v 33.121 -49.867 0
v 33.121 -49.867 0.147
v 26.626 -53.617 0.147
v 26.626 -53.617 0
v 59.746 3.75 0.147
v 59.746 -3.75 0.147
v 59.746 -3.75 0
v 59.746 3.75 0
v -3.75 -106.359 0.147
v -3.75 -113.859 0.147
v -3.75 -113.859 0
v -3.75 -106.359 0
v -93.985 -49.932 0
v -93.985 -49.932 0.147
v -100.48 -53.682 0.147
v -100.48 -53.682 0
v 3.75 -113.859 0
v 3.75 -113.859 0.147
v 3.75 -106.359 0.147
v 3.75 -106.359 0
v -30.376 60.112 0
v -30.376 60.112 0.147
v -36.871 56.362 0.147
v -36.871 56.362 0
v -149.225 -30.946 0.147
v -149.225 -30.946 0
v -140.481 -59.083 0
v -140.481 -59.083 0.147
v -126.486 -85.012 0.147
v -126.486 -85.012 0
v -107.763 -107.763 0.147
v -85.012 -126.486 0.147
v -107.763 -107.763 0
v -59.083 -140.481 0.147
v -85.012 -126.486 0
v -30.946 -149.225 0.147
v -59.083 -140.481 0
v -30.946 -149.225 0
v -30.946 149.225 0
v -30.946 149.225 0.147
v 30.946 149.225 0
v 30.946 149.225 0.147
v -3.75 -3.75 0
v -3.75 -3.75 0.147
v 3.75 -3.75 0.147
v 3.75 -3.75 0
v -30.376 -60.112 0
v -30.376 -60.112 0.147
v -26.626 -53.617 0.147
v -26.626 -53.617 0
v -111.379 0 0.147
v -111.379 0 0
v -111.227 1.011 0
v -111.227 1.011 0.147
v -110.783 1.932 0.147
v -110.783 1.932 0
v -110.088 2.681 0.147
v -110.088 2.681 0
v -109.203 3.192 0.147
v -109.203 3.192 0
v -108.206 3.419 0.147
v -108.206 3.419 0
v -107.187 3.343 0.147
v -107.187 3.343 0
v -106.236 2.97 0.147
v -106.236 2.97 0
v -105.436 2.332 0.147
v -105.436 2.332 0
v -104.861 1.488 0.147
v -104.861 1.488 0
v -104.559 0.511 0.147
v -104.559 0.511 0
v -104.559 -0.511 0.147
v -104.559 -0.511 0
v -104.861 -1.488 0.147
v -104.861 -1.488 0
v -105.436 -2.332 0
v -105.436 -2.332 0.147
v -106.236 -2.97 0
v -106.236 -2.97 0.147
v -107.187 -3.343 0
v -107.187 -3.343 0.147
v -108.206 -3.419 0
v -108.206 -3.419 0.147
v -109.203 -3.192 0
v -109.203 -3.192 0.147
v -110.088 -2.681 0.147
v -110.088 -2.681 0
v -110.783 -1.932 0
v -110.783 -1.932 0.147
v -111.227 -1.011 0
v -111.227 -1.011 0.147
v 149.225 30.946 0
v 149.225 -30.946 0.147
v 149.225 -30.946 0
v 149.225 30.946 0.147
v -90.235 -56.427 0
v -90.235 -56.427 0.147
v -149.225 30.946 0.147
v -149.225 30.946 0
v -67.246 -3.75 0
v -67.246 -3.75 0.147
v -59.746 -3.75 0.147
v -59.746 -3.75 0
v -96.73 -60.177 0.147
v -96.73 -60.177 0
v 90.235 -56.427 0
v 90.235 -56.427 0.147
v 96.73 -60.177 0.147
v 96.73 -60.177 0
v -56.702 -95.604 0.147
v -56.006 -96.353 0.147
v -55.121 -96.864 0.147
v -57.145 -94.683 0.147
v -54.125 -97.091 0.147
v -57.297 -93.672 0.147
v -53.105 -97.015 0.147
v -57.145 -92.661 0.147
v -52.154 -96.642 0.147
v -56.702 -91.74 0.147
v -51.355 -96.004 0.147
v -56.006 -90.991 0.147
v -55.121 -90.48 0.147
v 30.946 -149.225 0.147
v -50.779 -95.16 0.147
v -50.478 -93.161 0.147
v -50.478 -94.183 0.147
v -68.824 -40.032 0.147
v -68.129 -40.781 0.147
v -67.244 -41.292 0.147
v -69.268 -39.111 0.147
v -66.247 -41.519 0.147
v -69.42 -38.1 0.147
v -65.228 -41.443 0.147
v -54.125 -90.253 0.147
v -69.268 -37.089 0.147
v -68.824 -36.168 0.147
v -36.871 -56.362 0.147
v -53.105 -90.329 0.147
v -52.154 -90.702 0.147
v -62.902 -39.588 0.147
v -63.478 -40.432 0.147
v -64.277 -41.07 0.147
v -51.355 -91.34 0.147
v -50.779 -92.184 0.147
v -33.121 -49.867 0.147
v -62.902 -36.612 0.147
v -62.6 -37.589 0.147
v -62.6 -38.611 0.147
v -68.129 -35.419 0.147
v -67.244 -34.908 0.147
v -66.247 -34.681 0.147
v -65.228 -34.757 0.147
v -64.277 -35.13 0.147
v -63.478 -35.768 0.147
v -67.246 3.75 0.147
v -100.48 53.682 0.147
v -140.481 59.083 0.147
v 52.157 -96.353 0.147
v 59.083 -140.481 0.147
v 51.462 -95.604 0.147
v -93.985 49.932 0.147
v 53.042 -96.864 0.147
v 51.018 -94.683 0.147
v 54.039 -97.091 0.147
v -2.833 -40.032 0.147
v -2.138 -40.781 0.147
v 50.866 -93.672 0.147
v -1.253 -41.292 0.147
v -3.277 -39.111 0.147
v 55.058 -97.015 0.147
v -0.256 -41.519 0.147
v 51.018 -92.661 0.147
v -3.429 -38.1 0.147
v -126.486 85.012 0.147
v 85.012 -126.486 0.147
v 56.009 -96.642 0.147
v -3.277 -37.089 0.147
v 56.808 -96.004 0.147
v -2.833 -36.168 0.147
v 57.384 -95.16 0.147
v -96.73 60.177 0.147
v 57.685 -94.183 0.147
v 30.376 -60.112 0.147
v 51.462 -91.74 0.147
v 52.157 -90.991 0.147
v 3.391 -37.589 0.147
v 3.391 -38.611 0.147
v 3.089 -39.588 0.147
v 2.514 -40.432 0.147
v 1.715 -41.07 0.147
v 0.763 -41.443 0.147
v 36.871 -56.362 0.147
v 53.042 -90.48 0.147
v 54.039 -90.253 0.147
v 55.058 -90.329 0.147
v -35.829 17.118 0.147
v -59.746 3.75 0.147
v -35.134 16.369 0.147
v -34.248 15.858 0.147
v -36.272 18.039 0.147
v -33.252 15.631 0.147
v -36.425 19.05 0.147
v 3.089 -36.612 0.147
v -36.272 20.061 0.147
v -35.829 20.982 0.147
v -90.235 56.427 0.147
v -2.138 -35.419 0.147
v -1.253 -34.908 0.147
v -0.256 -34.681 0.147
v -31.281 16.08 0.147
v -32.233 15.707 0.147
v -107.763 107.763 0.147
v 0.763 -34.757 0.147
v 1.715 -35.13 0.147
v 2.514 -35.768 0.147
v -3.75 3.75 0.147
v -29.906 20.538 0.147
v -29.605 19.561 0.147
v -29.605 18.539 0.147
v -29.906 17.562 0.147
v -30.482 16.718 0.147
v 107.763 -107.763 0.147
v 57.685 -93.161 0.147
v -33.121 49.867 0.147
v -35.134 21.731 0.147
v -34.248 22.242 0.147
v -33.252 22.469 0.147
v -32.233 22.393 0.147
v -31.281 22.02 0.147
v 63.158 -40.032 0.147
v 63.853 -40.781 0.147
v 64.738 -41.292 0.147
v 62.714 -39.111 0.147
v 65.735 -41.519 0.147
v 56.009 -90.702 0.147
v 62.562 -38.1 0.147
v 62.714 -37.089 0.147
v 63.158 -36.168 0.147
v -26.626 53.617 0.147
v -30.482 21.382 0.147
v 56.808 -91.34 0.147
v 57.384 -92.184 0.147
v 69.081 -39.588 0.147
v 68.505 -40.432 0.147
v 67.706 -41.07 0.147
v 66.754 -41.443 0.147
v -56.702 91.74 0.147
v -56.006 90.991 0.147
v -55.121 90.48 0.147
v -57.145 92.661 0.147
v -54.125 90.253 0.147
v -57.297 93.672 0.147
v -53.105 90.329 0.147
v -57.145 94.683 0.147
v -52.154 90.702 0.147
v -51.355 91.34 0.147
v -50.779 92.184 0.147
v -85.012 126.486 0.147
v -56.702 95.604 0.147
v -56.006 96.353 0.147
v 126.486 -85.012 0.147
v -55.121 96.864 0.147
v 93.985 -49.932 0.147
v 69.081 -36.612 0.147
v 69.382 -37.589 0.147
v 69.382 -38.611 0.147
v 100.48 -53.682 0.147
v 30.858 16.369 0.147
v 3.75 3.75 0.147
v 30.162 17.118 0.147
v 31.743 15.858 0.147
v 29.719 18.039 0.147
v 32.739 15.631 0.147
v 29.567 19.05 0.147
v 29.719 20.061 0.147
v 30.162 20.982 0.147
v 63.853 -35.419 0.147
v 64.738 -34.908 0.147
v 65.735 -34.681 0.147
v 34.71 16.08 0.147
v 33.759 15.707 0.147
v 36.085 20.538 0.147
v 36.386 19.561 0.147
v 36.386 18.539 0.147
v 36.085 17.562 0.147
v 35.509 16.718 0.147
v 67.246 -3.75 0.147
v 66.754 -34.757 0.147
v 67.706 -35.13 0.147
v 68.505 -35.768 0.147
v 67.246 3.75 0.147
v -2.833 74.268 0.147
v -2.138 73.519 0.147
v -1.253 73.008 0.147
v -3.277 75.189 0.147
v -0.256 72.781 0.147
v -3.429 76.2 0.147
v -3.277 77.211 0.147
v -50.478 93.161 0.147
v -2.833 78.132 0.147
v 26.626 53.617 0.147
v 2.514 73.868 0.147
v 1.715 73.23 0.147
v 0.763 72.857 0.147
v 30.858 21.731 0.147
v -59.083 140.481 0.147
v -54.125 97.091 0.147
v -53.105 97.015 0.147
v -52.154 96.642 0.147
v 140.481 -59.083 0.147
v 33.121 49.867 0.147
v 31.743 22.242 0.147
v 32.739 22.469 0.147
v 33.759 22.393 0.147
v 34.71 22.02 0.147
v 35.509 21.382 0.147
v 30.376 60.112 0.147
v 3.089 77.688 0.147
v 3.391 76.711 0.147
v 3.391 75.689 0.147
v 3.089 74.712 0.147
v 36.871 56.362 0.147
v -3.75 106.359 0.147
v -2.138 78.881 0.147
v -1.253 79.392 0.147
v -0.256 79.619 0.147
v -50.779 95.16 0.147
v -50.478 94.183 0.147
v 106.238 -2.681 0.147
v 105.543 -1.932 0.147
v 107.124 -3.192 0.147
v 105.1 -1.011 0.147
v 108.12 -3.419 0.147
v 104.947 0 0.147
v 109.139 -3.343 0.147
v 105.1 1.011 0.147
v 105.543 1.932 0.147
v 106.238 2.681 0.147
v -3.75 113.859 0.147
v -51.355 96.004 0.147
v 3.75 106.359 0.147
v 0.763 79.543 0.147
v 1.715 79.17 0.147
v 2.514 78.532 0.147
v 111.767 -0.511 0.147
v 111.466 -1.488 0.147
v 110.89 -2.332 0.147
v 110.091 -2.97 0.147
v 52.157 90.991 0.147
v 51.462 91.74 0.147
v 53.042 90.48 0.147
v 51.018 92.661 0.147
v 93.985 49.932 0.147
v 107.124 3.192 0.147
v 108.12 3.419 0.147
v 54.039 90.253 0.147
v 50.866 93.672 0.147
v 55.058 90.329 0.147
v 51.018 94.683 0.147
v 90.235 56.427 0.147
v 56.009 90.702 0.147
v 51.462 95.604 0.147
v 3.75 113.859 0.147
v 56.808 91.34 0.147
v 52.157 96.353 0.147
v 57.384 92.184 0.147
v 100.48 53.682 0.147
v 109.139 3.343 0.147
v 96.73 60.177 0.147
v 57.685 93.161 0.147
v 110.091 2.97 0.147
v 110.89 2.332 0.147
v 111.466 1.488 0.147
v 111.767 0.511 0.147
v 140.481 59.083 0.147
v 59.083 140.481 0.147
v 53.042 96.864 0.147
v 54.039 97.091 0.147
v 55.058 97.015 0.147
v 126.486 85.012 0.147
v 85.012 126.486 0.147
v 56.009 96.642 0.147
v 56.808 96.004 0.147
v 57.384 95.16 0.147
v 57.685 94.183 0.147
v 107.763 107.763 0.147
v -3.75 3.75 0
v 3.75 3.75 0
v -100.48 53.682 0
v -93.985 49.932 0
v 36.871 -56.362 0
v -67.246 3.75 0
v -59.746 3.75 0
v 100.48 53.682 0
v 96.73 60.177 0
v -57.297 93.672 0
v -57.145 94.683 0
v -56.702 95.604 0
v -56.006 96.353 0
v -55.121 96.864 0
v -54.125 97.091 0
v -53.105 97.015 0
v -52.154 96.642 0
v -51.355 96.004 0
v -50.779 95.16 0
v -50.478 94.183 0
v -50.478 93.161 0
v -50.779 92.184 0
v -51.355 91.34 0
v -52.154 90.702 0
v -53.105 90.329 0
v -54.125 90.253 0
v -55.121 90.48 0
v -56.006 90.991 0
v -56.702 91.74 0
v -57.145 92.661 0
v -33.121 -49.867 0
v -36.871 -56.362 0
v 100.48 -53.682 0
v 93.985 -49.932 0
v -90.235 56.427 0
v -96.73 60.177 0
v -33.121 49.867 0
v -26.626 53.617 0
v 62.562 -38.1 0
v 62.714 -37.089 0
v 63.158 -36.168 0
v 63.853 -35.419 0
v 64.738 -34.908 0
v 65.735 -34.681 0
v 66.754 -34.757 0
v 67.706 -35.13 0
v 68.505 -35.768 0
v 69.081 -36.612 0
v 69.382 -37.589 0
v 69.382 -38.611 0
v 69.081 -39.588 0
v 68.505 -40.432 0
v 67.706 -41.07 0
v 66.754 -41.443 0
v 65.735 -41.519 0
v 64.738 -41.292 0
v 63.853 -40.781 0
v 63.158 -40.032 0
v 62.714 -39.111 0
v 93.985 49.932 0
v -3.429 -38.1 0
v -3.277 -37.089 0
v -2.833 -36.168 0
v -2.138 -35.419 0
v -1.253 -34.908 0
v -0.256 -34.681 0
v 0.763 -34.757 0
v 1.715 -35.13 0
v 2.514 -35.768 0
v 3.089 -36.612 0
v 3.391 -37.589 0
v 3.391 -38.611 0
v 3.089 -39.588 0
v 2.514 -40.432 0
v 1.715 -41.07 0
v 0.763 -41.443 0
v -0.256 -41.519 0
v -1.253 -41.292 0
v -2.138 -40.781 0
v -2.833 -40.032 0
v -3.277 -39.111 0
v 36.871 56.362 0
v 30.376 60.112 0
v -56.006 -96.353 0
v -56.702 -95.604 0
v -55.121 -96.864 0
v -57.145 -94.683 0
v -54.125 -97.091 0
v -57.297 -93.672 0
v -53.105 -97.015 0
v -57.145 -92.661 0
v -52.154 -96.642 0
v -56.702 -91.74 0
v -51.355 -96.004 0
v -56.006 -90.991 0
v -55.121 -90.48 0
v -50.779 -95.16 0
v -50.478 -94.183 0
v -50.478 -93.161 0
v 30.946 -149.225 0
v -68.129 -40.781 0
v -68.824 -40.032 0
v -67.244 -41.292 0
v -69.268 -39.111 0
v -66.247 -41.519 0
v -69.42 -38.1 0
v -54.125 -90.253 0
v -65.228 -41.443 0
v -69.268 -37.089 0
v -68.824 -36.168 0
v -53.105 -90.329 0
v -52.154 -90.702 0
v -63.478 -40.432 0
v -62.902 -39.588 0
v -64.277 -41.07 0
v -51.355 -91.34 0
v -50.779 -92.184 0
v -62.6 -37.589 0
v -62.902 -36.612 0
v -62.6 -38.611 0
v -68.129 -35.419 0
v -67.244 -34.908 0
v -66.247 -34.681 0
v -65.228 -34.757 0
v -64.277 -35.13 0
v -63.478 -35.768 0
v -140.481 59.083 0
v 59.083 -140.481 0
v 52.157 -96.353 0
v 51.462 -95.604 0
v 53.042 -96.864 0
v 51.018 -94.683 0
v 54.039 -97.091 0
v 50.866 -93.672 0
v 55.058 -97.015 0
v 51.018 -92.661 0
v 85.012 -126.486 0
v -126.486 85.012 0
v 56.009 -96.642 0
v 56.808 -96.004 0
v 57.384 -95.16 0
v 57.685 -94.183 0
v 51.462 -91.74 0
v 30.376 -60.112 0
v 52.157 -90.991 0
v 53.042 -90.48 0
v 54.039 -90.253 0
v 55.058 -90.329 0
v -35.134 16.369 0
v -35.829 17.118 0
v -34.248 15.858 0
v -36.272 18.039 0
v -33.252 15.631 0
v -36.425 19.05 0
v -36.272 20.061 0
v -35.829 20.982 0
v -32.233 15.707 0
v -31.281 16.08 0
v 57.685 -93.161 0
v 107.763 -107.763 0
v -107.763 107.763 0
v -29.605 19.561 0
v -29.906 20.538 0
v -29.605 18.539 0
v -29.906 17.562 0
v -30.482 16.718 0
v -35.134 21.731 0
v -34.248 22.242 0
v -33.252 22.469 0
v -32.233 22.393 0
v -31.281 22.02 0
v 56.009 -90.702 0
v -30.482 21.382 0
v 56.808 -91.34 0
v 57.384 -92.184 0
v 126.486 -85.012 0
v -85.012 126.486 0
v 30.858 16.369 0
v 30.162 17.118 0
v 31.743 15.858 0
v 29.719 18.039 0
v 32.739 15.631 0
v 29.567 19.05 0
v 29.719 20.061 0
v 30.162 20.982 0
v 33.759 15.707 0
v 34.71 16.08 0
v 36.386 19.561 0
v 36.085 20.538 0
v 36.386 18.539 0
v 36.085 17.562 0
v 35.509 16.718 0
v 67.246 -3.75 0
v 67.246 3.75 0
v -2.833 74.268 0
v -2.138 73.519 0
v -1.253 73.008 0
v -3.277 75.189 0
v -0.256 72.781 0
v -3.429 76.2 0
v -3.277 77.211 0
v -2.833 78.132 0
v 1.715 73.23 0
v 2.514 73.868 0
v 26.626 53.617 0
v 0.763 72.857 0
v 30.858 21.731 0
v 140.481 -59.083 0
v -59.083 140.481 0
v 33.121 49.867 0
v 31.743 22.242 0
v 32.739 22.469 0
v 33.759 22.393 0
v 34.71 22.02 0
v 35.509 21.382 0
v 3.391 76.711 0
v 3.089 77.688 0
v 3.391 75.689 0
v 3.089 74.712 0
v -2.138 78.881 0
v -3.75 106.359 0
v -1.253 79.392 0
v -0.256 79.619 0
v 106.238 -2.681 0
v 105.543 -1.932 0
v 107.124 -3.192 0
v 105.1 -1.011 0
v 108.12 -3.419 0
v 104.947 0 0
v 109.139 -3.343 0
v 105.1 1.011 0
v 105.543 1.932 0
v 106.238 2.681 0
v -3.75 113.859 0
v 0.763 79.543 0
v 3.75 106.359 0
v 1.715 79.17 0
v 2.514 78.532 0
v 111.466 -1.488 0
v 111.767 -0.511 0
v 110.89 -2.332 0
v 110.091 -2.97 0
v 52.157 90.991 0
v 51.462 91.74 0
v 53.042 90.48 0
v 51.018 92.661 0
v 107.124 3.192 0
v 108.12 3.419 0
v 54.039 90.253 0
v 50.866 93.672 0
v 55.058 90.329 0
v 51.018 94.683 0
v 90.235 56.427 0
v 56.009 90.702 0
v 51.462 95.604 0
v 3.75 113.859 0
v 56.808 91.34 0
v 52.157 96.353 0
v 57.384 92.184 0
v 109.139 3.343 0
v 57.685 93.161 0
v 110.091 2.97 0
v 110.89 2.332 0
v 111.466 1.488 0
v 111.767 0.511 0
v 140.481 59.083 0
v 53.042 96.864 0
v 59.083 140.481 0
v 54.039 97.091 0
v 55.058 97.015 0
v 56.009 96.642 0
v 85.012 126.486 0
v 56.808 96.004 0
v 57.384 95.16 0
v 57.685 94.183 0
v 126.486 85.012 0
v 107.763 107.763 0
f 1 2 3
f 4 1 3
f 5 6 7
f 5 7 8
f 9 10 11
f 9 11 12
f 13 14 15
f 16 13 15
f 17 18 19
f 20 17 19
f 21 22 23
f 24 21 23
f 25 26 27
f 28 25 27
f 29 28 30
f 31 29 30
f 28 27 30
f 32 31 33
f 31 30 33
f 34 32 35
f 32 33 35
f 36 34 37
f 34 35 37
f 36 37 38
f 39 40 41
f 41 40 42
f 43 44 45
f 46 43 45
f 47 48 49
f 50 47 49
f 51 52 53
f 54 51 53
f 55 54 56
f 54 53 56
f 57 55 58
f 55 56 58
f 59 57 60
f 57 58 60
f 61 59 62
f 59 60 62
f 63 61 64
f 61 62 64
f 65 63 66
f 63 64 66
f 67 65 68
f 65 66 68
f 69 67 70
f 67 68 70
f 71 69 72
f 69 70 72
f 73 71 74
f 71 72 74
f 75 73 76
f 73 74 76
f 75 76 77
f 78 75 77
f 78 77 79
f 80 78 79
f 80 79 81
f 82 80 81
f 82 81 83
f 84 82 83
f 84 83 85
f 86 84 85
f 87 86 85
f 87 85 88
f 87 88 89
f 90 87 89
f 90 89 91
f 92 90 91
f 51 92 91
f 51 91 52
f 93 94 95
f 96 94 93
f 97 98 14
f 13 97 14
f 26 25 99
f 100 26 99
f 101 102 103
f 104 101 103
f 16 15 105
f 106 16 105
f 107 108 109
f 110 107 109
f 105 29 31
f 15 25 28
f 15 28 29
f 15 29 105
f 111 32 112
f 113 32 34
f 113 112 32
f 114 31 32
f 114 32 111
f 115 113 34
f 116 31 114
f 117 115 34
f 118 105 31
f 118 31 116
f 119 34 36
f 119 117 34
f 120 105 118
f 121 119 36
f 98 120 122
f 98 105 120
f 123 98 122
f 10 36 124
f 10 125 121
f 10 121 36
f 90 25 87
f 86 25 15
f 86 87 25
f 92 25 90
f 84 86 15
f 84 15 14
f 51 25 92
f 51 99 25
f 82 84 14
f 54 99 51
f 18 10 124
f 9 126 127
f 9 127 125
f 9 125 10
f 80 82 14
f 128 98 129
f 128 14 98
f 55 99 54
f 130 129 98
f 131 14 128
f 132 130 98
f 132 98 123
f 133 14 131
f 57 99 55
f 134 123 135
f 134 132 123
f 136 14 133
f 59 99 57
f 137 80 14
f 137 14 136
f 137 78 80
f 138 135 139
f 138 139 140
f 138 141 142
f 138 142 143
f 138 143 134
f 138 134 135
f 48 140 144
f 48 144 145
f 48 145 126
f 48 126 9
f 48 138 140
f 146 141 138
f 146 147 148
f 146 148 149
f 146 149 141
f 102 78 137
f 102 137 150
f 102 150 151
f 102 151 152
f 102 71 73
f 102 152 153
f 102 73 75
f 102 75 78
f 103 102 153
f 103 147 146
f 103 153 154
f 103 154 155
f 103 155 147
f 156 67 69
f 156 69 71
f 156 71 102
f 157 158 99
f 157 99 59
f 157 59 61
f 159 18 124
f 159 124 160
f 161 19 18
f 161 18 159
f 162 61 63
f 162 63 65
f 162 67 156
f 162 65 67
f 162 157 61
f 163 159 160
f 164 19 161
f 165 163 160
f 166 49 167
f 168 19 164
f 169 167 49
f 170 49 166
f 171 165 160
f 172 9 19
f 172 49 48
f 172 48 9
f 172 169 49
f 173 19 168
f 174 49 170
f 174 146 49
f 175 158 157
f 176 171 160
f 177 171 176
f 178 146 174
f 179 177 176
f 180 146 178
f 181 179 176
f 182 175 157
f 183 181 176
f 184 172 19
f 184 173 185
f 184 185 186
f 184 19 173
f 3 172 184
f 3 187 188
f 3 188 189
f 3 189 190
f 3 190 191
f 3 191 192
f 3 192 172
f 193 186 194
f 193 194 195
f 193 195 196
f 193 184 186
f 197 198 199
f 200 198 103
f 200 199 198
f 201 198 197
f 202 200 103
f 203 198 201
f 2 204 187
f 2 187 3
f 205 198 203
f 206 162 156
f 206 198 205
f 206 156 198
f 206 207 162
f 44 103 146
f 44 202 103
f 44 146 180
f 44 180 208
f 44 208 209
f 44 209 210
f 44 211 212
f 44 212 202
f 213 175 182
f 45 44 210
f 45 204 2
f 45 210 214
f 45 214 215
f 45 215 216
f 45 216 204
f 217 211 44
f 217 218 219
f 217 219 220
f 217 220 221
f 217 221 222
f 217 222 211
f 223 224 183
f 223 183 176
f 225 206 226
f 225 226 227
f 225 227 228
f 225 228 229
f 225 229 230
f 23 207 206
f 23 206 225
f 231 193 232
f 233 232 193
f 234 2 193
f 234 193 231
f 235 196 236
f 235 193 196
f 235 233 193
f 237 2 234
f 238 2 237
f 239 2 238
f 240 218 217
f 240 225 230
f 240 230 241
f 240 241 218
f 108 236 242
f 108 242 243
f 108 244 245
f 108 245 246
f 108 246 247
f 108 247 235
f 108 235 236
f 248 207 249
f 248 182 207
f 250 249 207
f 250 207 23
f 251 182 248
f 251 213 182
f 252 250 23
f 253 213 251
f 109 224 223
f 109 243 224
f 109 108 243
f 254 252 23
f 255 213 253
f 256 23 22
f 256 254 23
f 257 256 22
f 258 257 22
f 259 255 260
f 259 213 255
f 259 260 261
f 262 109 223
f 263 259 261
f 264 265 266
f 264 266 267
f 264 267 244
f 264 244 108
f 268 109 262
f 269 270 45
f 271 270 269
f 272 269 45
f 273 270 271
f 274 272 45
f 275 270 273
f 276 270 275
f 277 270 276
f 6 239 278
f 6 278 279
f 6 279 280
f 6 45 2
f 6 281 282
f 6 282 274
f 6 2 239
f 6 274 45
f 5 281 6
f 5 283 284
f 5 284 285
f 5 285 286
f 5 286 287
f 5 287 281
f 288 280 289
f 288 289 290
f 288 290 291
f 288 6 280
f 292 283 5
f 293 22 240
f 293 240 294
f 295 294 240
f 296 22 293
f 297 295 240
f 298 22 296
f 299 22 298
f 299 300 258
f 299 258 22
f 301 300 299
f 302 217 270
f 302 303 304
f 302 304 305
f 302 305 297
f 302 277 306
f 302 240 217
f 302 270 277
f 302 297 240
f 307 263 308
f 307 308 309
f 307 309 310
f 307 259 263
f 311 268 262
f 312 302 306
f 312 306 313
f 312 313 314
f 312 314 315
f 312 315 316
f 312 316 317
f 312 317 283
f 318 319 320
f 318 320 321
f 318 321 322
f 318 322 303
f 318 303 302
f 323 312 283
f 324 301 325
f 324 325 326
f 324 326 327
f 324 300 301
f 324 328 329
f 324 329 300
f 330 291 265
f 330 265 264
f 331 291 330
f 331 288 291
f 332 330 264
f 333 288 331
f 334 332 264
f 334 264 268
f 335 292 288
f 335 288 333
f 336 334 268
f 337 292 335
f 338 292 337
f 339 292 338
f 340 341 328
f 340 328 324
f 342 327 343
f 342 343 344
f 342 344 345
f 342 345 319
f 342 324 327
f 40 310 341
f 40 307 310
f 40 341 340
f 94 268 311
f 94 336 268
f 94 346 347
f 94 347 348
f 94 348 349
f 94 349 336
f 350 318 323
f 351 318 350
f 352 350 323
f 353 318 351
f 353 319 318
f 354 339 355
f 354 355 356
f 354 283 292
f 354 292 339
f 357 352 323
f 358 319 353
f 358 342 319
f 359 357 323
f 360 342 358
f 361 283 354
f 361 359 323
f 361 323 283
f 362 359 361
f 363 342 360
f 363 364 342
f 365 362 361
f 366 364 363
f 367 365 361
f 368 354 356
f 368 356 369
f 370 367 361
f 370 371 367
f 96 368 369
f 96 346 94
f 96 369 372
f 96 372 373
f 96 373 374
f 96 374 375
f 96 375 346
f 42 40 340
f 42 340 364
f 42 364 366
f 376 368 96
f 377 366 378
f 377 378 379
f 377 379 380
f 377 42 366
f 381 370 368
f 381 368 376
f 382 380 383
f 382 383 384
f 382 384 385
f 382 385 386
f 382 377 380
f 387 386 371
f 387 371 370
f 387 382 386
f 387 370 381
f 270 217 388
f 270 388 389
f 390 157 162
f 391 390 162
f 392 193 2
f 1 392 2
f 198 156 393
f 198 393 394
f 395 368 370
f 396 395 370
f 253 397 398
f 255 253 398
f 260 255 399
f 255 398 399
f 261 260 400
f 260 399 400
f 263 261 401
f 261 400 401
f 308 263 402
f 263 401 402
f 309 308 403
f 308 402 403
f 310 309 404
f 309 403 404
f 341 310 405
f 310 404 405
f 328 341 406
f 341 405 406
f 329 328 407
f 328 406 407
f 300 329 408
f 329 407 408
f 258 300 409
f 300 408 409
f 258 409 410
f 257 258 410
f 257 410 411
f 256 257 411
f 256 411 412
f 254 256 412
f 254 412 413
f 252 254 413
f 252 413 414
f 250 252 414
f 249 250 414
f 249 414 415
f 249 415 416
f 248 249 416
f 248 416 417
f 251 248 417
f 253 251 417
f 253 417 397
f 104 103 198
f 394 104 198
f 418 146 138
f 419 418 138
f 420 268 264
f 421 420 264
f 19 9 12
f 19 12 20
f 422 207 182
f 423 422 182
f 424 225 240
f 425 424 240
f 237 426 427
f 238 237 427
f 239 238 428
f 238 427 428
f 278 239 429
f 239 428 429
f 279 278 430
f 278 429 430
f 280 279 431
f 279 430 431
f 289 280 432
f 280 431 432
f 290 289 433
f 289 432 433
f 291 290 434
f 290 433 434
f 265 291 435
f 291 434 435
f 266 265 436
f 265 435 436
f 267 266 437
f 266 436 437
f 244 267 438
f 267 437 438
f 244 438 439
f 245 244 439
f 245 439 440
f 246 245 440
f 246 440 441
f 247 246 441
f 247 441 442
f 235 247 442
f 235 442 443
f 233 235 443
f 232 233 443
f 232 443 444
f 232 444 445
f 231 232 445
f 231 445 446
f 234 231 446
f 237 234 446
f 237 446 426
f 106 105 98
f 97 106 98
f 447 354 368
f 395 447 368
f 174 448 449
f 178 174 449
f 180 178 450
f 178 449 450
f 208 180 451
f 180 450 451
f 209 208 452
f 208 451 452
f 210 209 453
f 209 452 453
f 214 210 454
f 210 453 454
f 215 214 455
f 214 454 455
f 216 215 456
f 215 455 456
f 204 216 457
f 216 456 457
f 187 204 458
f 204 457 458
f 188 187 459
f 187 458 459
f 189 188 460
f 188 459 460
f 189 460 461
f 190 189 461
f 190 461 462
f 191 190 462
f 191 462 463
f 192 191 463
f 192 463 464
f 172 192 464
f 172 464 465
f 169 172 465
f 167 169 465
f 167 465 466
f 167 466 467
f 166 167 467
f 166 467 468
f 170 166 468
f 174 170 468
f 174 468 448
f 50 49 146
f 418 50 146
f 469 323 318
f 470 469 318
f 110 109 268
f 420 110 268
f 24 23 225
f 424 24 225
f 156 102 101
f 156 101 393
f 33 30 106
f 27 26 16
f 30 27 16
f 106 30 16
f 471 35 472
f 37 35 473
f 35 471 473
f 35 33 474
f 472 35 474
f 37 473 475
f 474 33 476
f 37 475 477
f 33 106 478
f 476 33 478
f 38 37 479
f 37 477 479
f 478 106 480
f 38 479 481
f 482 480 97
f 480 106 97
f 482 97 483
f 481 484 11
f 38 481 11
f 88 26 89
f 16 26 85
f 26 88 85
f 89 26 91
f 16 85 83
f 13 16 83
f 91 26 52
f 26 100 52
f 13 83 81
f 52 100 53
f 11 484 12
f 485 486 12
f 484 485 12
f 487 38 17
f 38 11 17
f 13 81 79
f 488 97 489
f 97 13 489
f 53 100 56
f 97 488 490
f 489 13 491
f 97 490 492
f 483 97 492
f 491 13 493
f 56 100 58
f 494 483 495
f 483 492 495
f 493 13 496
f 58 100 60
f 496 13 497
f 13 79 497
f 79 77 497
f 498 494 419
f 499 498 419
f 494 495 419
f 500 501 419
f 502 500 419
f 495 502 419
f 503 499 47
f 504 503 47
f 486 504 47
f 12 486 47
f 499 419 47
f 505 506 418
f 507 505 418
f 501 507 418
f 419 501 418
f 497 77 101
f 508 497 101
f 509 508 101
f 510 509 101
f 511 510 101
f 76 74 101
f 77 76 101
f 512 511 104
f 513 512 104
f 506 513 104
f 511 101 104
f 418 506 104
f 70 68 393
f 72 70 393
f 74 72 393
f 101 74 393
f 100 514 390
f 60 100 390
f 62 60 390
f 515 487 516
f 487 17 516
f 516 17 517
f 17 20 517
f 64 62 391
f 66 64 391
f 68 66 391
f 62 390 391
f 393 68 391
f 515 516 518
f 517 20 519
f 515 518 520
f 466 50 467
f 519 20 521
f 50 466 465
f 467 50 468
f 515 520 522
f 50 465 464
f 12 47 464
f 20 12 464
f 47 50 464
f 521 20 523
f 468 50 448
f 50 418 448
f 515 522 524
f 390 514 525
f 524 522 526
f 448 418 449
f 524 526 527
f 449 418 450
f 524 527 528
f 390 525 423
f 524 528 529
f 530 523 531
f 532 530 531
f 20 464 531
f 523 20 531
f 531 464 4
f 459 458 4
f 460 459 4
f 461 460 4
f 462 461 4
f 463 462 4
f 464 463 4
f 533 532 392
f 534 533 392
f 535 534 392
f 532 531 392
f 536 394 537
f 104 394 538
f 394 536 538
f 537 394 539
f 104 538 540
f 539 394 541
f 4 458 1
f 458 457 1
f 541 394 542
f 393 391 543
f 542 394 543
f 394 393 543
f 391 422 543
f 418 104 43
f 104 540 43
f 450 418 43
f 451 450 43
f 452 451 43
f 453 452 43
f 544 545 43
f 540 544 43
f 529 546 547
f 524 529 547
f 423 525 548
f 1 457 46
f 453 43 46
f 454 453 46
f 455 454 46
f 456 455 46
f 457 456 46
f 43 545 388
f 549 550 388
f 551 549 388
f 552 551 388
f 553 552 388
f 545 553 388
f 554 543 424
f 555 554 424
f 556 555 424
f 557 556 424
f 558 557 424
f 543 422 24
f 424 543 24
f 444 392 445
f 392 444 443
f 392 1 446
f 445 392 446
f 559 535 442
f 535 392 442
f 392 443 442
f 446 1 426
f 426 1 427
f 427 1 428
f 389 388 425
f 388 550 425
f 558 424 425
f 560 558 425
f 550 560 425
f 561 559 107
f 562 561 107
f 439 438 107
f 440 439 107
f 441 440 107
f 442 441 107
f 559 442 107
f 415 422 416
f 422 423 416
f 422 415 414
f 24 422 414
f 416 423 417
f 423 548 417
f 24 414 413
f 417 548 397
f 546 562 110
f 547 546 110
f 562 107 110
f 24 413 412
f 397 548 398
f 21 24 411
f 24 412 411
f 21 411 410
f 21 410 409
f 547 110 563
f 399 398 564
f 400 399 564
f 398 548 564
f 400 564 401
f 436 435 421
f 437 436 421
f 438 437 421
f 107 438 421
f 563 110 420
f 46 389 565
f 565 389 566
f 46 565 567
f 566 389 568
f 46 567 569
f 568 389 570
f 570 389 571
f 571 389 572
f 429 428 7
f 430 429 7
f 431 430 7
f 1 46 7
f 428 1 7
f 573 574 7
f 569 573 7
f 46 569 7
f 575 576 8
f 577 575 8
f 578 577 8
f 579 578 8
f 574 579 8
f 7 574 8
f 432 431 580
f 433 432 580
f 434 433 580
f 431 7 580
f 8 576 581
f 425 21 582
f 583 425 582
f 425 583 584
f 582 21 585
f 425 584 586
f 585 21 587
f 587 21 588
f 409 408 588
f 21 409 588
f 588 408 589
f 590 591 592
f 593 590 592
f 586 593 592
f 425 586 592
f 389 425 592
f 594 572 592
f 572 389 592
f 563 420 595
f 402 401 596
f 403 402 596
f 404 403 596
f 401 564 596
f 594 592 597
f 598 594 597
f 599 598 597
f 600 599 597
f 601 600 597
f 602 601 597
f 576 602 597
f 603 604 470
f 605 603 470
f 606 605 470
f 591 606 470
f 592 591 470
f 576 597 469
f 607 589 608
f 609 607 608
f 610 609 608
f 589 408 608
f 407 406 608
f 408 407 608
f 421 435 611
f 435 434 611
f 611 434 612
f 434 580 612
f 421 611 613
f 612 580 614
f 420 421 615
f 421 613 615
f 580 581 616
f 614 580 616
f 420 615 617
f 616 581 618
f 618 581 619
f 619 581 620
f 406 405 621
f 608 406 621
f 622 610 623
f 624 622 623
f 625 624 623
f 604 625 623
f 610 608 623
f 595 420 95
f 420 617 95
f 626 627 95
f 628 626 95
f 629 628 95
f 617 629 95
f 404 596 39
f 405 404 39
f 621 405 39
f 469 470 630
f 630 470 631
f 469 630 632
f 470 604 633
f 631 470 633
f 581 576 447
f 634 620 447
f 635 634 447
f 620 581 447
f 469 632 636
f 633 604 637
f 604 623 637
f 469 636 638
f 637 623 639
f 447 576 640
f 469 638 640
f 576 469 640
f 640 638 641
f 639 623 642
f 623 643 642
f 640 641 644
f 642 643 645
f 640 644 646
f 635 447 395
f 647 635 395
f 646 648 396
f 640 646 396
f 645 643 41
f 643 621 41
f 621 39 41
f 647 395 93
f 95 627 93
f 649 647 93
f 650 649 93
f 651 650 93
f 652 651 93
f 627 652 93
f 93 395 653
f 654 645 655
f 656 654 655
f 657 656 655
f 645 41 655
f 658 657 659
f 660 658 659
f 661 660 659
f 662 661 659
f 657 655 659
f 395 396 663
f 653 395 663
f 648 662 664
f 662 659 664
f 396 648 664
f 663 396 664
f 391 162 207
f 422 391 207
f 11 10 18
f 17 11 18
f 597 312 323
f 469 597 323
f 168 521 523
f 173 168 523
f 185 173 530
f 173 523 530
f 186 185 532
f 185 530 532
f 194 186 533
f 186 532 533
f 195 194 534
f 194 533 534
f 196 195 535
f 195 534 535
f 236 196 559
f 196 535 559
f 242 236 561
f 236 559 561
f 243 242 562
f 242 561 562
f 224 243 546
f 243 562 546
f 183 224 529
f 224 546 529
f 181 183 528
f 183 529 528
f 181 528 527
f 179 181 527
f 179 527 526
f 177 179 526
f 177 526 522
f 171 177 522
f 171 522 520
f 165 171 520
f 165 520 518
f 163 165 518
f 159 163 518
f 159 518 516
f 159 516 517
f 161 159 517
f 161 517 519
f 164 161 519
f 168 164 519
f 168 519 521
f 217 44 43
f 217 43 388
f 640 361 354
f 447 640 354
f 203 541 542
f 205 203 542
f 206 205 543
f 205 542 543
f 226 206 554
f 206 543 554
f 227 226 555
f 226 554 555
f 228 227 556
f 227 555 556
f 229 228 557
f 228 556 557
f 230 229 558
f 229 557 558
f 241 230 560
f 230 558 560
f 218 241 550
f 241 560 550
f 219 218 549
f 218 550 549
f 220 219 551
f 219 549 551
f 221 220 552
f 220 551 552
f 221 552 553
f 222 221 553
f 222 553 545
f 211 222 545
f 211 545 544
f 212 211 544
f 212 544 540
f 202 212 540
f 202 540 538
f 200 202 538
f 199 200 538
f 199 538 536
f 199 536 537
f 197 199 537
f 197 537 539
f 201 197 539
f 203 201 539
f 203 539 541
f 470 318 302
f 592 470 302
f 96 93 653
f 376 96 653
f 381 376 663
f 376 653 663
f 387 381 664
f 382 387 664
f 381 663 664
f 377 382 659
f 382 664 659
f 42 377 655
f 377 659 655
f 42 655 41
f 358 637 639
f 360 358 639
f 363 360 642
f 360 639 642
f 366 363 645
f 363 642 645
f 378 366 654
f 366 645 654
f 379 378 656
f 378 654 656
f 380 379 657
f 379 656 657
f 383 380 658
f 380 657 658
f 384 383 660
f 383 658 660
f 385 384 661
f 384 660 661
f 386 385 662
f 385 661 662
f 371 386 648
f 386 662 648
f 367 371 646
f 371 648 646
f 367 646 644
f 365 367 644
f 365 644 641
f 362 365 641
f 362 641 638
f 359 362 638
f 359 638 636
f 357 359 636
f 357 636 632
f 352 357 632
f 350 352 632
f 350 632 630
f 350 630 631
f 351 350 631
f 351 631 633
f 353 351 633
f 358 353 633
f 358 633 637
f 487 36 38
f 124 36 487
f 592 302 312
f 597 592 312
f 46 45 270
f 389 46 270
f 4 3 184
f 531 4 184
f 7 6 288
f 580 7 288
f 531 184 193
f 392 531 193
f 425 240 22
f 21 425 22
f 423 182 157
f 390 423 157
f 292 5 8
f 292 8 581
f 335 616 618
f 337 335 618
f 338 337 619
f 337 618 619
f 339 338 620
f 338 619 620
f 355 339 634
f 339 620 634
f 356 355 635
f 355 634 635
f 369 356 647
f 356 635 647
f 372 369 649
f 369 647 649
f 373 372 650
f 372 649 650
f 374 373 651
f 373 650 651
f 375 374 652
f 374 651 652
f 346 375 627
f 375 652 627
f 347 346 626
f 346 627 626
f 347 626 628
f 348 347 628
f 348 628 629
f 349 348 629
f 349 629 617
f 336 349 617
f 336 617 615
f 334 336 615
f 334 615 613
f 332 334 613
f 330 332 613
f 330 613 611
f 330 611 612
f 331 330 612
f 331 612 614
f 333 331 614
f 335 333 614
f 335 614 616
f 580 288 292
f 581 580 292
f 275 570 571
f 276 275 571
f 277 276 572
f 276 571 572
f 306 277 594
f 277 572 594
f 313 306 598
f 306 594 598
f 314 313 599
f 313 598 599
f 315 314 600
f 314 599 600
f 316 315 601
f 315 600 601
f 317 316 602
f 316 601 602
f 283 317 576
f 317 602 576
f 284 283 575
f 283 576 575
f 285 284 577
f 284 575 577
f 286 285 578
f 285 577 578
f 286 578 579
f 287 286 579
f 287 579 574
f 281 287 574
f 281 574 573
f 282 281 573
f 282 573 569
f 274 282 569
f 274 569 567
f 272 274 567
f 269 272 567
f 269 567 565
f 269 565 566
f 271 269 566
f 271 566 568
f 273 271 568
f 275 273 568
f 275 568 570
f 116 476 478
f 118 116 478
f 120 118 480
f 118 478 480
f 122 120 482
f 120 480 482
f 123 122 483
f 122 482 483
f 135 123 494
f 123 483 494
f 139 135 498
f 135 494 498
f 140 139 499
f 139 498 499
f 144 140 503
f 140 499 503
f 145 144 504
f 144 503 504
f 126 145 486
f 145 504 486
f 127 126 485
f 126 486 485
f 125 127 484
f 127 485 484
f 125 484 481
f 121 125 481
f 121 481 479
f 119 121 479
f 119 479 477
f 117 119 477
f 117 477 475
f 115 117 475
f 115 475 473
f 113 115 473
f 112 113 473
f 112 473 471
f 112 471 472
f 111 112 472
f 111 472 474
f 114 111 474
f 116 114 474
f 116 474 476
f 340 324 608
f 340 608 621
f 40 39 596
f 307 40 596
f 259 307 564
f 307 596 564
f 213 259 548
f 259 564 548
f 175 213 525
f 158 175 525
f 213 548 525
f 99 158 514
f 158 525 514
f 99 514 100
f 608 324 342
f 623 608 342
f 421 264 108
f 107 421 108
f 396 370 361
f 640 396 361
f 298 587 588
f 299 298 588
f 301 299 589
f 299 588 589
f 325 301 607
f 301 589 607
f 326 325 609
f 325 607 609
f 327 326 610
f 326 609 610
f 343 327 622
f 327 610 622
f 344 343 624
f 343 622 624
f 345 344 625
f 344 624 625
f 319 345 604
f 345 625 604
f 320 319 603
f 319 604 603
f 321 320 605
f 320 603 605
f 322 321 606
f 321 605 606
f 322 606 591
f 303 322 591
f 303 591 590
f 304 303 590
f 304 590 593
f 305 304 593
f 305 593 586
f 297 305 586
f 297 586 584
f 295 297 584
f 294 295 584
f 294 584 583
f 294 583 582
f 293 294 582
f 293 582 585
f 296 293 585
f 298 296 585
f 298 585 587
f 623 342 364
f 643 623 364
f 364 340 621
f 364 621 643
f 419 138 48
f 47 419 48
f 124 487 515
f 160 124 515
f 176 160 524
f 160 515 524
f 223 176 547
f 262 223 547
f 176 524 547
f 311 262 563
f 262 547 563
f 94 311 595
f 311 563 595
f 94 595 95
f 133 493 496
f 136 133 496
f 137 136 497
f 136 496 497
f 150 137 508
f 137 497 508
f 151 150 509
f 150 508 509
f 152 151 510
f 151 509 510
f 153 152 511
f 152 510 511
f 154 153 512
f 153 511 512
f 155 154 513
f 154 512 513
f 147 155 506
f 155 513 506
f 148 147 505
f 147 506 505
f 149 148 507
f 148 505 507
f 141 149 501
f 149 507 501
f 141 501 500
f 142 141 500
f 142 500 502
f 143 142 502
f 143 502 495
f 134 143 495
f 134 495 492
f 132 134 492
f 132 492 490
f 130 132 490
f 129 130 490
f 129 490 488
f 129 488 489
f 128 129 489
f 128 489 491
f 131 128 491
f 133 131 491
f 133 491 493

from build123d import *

# Parameters (mm, degrees)
F0_R     = 152.4
F1_DEPTH = 0.14732
F2_W     = 12.7
F2_H     = 127
F2_W_2   = 127
F2_H_2   = 12.7
F3_DEPTH = 25.4
F5_D     = 6.858
F6_W     = 7.5
F6_H     = 7.5
F7_DEPTH = 25.4


with BuildPart() as f1:
    # F0 (on Top) → F1 (new body)
    with BuildSketch(Plane.XY):
        Circle(F0_R)
    extrude(amount=F1_DEPTH)

    # F2 (on face) → F3 (cut)
    with BuildSketch(Plane.XY.offset(0.14732)):
        with Locations((-155.575, 0)):
            Rectangle(F2_W, F2_H)
        with Locations((0, -155.575)):
            Rectangle(F2_W_2, F2_H_2)
        with Locations((0, 155.575)):
            Rectangle(F2_W_2, F2_H_2)
        with Locations((155.575, 0)):
            Rectangle(F2_W, F2_H)
    extrude(amount=-F3_DEPTH, mode=Mode.SUBTRACT)

    # F5 (through all)
    with Locations(Plane.XY.offset(0.14732)):
        with Locations((-53.868412, -93.672059), (54.294765, -93.672059), (65.991136, -38.1), (0, -38.1), (-65.991136, -38.1), (-107.95, 0), (-32.995568, 19.05), (32.995568, 19.05), (108.376353, 0), (0, 76.2), (54.294765, 93.672059), (-53.868412, 93.672059)):
            Hole(F5_D / 2)

    # F6 (on face) → F7 (cut)
    with BuildSketch(Plane.XY.offset(0.14732)):
        Rectangle(F6_W, F6_H)
        with Locations((-63.4965, 0)):
            Rectangle(F6_W, F6_H)
        with Locations((0, 110.109)):
            Rectangle(F6_W, F6_H)
        Polygon((-36.870845, -56.362177), (-30.375655, -60.112177), (-26.625655, -53.616987), (-33.120845, -49.866987), align=None)
        Polygon((30.375655, -60.112177), (36.870845, -56.362177), (33.120845, -49.866987), (26.625655, -53.616987), align=None)
        with Locations((63.4965, 0)):
            Rectangle(F6_W, F6_H)
        Polygon((36.870845, 56.362177), (30.375655, 60.112177), (26.625655, 53.616987), (33.120845, 49.866987), align=None)
        Polygon((-30.375655, 60.112177), (-36.870845, 56.362177), (-33.120845, 49.866987), (-26.625655, 53.616987), align=None)
        Polygon((-100.479786, 53.681905), (-93.984596, 49.931905), (-90.234596, 56.427095), (-96.729786, 60.177095), align=None)
        Polygon((-96.729786, -60.177095), (-90.234596, -56.427095), (-93.984596, -49.931905), (-100.479786, -53.681905), align=None)
        with Locations((0, -110.109)):
            Rectangle(F6_W, F6_H)
        Polygon((100.479786, -53.681905), (93.984596, -49.931905), (90.234596, -56.427095), (96.729786, -60.177095), align=None)
        Polygon((96.729786, 60.177095), (90.234596, 56.427095), (93.984596, 49.931905), (100.479786, 53.681905), align=None)
    extrude(amount=-F7_DEPTH, mode=Mode.SUBTRACT)


solid = f1.part
